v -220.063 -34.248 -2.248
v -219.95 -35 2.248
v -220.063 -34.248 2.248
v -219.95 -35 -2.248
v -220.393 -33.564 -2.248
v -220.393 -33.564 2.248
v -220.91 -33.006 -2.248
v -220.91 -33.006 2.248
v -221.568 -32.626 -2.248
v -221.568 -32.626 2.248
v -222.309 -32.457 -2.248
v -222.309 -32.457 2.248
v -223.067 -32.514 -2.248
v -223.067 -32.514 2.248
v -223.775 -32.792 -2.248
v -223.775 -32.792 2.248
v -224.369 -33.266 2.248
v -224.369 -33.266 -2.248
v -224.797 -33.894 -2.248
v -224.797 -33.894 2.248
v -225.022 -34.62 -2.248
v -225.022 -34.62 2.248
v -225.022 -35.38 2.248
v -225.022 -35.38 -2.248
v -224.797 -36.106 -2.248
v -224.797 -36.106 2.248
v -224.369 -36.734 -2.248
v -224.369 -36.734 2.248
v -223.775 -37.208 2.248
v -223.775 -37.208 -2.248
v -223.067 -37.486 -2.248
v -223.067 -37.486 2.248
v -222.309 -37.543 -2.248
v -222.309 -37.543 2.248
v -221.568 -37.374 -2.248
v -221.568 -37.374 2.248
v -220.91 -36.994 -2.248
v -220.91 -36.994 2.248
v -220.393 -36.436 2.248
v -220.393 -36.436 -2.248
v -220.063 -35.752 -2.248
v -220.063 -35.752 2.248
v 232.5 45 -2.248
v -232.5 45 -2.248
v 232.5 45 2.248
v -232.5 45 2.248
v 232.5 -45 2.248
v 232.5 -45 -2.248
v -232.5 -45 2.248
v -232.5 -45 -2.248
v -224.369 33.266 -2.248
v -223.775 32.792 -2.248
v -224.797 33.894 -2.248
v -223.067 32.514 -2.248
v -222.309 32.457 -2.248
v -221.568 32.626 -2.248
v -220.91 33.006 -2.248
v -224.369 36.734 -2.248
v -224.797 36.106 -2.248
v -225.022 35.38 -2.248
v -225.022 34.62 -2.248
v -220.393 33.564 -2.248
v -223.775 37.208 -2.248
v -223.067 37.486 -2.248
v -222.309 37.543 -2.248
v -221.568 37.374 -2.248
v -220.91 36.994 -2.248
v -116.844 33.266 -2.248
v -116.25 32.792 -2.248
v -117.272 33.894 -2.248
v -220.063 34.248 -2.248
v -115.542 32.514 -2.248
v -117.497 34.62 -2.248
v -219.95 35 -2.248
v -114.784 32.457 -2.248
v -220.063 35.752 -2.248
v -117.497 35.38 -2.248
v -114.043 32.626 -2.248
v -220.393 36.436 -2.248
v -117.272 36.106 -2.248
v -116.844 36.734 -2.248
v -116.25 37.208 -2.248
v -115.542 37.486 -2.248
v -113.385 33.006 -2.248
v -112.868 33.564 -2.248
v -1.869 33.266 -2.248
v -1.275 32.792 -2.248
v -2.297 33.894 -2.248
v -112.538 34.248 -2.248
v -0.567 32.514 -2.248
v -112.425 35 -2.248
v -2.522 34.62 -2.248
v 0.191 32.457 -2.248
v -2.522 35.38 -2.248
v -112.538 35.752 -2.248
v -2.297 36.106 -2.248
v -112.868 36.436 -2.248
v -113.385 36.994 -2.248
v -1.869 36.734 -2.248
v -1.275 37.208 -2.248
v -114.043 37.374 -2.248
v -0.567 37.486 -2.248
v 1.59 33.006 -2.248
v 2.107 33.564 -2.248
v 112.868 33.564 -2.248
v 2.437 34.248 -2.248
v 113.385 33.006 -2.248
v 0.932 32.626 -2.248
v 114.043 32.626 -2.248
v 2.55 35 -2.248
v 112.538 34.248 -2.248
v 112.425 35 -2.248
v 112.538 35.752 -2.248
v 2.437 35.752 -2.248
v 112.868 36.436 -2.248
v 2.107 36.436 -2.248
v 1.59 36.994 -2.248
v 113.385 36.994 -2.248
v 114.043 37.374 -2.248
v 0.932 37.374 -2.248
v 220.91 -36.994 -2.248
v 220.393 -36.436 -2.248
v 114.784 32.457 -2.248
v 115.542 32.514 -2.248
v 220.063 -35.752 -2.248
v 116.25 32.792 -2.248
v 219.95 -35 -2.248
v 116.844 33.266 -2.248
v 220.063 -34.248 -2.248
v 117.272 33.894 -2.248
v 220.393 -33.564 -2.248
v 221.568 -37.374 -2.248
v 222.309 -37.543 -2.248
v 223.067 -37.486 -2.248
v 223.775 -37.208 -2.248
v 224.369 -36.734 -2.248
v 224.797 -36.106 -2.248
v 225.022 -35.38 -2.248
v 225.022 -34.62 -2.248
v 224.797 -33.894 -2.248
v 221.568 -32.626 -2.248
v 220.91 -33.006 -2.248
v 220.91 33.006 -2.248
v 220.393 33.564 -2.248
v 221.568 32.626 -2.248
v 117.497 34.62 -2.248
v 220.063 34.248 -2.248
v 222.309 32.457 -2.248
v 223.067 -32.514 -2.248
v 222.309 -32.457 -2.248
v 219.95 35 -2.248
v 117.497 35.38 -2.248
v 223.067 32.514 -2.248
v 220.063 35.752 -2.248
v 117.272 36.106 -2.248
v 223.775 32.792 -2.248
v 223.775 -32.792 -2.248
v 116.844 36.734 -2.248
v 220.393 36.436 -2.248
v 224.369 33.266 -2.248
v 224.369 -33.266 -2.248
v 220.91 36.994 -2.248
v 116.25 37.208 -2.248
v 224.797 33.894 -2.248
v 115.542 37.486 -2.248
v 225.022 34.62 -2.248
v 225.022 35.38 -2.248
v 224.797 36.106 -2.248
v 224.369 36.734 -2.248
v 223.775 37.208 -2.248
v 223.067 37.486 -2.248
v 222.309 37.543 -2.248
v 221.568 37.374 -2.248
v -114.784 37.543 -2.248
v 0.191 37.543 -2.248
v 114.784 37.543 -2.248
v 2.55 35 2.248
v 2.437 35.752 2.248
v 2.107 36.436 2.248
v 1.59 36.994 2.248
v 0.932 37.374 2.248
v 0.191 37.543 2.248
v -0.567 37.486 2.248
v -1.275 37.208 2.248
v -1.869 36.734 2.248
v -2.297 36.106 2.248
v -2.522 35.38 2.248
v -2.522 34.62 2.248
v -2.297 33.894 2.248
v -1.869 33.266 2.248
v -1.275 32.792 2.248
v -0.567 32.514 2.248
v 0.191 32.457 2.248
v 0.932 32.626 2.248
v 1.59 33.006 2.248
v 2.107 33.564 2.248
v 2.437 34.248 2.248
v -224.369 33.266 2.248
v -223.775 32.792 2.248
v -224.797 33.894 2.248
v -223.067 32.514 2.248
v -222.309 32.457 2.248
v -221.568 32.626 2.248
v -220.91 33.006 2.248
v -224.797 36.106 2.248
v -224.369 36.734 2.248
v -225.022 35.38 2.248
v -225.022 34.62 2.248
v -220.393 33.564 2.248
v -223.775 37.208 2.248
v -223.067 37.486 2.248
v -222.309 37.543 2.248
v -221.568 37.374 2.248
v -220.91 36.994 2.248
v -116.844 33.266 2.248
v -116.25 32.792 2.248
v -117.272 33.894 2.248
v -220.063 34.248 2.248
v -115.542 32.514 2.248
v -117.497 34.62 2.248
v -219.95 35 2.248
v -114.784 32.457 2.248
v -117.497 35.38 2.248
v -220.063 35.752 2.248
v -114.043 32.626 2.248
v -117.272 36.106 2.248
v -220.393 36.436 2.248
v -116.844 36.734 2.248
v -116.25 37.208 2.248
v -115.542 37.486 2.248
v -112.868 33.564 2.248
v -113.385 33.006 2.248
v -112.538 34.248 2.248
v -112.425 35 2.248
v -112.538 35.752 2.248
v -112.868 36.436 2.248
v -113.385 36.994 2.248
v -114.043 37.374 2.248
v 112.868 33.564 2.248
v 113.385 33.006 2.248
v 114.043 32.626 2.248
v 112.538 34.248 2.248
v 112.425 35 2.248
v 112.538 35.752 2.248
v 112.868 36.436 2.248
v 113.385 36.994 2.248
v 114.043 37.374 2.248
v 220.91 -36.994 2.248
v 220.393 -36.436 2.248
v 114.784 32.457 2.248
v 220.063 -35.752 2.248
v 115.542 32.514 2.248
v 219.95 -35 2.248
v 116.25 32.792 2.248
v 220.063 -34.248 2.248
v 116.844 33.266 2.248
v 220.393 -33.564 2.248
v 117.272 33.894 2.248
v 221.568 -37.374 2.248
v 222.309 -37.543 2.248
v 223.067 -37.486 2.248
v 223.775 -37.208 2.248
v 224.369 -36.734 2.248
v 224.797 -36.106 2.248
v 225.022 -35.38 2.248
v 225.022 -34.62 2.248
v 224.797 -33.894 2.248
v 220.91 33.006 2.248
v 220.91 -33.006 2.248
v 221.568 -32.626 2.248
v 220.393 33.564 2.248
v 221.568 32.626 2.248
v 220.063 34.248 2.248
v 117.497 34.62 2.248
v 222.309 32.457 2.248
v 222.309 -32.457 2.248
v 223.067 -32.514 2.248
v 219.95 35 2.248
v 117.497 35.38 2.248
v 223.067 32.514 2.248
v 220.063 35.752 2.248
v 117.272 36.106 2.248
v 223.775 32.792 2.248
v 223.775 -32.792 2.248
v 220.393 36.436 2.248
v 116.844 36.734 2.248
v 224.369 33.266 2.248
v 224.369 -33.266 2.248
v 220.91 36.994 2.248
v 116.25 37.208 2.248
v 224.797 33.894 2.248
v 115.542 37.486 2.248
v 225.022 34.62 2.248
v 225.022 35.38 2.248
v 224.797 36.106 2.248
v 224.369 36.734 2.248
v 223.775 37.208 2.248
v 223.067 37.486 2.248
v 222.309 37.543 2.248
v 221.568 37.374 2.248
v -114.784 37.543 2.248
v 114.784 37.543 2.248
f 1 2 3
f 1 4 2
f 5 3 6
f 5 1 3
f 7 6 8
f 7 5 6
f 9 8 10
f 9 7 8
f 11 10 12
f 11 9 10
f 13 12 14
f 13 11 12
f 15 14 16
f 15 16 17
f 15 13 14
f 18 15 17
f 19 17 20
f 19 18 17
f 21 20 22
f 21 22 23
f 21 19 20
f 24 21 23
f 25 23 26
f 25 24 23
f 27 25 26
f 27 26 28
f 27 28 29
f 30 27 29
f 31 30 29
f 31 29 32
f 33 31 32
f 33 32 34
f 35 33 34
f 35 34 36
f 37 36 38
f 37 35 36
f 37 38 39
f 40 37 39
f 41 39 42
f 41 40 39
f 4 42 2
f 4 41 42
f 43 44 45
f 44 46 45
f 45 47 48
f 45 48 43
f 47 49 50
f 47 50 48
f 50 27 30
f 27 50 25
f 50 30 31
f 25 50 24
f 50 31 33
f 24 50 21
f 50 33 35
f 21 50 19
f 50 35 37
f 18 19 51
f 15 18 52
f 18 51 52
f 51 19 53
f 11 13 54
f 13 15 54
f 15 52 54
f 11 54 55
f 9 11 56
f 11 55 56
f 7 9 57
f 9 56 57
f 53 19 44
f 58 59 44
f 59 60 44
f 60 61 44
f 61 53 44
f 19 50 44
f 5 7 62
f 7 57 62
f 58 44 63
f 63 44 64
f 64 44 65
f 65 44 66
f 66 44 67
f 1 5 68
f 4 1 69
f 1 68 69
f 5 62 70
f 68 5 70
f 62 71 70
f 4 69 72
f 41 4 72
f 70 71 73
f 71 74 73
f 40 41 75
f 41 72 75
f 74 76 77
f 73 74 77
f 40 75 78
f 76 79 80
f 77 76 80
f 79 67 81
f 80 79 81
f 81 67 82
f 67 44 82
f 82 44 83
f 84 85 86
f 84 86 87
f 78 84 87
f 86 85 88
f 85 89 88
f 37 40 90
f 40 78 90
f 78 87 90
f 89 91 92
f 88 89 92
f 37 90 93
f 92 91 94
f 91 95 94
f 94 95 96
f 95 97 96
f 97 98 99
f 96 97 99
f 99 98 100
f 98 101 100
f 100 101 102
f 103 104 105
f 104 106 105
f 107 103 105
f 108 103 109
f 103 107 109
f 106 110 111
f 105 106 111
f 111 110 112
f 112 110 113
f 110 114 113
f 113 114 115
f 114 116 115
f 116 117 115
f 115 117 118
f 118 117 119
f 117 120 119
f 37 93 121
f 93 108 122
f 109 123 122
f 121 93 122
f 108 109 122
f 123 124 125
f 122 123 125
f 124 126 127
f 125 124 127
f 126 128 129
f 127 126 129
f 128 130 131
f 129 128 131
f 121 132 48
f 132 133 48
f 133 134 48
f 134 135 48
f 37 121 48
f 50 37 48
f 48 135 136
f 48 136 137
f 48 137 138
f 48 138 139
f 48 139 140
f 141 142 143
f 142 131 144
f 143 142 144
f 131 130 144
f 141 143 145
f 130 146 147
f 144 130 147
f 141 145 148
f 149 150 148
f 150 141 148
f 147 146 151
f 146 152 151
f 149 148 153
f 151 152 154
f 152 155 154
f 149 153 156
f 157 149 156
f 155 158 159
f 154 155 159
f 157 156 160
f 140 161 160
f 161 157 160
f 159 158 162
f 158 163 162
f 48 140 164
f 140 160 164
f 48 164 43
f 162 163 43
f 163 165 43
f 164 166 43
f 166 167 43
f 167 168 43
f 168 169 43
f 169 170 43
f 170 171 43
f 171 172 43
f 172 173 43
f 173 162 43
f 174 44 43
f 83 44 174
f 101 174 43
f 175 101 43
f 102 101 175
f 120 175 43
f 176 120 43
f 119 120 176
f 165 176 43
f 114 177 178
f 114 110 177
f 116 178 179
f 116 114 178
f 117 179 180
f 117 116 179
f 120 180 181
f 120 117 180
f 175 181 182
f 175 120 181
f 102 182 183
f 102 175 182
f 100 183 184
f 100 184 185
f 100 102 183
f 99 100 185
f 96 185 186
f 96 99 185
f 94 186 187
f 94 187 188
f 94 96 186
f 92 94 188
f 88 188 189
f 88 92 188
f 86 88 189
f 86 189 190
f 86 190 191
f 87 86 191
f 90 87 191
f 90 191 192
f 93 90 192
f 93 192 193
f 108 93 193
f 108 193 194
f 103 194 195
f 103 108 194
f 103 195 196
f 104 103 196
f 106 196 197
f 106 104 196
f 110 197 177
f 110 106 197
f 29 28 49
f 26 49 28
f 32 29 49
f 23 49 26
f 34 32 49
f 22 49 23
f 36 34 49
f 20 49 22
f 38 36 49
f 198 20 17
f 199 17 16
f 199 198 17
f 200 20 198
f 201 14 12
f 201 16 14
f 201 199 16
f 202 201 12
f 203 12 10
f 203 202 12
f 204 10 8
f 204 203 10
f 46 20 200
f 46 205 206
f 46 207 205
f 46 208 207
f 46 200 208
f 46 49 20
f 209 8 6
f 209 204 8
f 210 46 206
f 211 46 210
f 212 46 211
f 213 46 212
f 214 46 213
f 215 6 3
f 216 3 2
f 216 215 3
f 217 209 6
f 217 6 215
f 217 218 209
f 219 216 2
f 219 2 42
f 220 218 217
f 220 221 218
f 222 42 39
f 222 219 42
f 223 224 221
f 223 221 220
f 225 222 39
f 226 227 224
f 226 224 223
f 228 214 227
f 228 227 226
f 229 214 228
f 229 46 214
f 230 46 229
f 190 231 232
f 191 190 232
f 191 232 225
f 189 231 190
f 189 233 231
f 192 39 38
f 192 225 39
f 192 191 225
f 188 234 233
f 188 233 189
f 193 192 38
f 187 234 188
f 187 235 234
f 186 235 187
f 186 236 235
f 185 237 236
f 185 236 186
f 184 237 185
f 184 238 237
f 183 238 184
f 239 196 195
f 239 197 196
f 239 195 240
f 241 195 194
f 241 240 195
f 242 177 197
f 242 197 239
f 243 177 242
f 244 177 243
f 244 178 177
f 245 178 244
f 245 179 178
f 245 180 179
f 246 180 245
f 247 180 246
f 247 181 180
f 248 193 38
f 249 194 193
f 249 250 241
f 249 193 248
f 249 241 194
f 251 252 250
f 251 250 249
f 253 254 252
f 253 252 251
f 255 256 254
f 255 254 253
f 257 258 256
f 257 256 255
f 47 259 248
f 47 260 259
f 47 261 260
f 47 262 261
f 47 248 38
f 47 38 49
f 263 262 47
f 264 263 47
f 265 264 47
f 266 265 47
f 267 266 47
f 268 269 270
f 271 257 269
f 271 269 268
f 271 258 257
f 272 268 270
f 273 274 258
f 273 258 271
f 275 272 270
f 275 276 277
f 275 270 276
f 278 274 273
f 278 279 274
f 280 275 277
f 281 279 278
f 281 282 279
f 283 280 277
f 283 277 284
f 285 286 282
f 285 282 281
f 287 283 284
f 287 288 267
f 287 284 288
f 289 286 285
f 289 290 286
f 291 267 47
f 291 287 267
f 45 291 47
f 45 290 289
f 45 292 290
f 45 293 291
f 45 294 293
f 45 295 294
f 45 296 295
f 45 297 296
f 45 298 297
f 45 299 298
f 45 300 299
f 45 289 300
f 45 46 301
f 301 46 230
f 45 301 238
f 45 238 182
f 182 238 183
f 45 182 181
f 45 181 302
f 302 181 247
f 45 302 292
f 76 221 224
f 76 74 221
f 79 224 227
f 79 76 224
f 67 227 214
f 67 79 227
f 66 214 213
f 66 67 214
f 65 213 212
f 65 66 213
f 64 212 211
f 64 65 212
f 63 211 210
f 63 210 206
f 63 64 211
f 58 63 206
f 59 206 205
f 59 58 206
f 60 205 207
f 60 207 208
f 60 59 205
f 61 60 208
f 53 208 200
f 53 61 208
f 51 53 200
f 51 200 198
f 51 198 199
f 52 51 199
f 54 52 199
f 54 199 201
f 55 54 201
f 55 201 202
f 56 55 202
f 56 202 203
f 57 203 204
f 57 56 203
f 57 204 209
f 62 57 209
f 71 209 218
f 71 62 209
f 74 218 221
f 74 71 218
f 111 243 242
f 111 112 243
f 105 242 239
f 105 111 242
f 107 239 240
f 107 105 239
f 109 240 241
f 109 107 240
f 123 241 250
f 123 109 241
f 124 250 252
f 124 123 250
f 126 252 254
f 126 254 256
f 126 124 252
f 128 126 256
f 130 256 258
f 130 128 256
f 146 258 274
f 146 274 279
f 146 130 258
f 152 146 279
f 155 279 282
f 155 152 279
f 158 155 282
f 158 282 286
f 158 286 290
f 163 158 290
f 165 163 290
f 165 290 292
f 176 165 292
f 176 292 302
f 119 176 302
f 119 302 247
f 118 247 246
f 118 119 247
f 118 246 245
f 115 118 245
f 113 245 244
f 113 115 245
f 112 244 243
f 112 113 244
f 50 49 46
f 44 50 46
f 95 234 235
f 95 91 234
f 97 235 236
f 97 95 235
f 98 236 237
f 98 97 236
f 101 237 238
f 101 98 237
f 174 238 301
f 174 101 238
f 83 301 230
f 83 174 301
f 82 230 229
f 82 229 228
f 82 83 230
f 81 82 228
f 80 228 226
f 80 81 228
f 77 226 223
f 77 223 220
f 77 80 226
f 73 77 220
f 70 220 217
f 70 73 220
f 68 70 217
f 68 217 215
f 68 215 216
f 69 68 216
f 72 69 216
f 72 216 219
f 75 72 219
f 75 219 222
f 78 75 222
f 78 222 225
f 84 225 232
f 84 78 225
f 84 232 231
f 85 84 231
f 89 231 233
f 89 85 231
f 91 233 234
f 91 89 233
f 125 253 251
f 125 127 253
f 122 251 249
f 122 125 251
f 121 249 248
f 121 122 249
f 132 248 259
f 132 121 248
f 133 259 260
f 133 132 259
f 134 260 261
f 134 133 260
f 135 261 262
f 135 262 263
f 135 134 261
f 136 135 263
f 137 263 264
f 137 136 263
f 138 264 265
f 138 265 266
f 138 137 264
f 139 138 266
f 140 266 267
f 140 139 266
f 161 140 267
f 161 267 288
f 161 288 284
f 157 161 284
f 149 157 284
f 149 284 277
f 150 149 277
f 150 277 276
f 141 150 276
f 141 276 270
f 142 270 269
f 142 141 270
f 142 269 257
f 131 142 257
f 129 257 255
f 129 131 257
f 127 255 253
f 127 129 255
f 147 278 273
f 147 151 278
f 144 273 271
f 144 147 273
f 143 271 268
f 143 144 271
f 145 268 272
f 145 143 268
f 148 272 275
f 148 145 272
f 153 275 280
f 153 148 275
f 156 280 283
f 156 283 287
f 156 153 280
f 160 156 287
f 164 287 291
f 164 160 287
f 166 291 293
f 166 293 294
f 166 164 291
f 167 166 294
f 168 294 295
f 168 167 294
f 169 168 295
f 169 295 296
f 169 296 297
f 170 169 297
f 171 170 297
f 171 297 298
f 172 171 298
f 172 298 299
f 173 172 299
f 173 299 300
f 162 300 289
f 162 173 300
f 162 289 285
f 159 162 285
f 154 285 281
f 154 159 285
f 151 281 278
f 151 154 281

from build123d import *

# Parameters (mm, degrees)
SKETCH1_W           = 465
SKETCH1_H           = 90
SKETCH1_R           = 2.55
BOSS_EXTRUDE1_DEPTH = 2.2479


with BuildPart() as part:
    # Sketch1 → Boss-Extrude1 (new, symmetric)
    with BuildSketch(Plane.XY):
        Rectangle(SKETCH1_W, SKETCH1_H)
        with Locations((-222.5, 35)):
            Circle(SKETCH1_R, mode=Mode.SUBTRACT)
        with Locations((-222.5, -35)):
            Circle(SKETCH1_R, mode=Mode.SUBTRACT)
        with Locations((0, 35)):
            Circle(SKETCH1_R, mode=Mode.SUBTRACT)
        with Locations((-114.975, 35)):
            Circle(SKETCH1_R, mode=Mode.SUBTRACT)
        with Locations(Location((222.5, -35, 0), (0, 0, 180))):
            Circle(SKETCH1_R, mode=Mode.SUBTRACT)
        with Locations(Location((222.5, 35, 0), (0, 0, 180))):
            Circle(SKETCH1_R, mode=Mode.SUBTRACT)
        with Locations(Location((114.975, 35, 0), (0, 0, 180))):
            Circle(SKETCH1_R, mode=Mode.SUBTRACT)
    extrude(amount=BOSS_EXTRUDE1_DEPTH, both=True)


solid = part.part
